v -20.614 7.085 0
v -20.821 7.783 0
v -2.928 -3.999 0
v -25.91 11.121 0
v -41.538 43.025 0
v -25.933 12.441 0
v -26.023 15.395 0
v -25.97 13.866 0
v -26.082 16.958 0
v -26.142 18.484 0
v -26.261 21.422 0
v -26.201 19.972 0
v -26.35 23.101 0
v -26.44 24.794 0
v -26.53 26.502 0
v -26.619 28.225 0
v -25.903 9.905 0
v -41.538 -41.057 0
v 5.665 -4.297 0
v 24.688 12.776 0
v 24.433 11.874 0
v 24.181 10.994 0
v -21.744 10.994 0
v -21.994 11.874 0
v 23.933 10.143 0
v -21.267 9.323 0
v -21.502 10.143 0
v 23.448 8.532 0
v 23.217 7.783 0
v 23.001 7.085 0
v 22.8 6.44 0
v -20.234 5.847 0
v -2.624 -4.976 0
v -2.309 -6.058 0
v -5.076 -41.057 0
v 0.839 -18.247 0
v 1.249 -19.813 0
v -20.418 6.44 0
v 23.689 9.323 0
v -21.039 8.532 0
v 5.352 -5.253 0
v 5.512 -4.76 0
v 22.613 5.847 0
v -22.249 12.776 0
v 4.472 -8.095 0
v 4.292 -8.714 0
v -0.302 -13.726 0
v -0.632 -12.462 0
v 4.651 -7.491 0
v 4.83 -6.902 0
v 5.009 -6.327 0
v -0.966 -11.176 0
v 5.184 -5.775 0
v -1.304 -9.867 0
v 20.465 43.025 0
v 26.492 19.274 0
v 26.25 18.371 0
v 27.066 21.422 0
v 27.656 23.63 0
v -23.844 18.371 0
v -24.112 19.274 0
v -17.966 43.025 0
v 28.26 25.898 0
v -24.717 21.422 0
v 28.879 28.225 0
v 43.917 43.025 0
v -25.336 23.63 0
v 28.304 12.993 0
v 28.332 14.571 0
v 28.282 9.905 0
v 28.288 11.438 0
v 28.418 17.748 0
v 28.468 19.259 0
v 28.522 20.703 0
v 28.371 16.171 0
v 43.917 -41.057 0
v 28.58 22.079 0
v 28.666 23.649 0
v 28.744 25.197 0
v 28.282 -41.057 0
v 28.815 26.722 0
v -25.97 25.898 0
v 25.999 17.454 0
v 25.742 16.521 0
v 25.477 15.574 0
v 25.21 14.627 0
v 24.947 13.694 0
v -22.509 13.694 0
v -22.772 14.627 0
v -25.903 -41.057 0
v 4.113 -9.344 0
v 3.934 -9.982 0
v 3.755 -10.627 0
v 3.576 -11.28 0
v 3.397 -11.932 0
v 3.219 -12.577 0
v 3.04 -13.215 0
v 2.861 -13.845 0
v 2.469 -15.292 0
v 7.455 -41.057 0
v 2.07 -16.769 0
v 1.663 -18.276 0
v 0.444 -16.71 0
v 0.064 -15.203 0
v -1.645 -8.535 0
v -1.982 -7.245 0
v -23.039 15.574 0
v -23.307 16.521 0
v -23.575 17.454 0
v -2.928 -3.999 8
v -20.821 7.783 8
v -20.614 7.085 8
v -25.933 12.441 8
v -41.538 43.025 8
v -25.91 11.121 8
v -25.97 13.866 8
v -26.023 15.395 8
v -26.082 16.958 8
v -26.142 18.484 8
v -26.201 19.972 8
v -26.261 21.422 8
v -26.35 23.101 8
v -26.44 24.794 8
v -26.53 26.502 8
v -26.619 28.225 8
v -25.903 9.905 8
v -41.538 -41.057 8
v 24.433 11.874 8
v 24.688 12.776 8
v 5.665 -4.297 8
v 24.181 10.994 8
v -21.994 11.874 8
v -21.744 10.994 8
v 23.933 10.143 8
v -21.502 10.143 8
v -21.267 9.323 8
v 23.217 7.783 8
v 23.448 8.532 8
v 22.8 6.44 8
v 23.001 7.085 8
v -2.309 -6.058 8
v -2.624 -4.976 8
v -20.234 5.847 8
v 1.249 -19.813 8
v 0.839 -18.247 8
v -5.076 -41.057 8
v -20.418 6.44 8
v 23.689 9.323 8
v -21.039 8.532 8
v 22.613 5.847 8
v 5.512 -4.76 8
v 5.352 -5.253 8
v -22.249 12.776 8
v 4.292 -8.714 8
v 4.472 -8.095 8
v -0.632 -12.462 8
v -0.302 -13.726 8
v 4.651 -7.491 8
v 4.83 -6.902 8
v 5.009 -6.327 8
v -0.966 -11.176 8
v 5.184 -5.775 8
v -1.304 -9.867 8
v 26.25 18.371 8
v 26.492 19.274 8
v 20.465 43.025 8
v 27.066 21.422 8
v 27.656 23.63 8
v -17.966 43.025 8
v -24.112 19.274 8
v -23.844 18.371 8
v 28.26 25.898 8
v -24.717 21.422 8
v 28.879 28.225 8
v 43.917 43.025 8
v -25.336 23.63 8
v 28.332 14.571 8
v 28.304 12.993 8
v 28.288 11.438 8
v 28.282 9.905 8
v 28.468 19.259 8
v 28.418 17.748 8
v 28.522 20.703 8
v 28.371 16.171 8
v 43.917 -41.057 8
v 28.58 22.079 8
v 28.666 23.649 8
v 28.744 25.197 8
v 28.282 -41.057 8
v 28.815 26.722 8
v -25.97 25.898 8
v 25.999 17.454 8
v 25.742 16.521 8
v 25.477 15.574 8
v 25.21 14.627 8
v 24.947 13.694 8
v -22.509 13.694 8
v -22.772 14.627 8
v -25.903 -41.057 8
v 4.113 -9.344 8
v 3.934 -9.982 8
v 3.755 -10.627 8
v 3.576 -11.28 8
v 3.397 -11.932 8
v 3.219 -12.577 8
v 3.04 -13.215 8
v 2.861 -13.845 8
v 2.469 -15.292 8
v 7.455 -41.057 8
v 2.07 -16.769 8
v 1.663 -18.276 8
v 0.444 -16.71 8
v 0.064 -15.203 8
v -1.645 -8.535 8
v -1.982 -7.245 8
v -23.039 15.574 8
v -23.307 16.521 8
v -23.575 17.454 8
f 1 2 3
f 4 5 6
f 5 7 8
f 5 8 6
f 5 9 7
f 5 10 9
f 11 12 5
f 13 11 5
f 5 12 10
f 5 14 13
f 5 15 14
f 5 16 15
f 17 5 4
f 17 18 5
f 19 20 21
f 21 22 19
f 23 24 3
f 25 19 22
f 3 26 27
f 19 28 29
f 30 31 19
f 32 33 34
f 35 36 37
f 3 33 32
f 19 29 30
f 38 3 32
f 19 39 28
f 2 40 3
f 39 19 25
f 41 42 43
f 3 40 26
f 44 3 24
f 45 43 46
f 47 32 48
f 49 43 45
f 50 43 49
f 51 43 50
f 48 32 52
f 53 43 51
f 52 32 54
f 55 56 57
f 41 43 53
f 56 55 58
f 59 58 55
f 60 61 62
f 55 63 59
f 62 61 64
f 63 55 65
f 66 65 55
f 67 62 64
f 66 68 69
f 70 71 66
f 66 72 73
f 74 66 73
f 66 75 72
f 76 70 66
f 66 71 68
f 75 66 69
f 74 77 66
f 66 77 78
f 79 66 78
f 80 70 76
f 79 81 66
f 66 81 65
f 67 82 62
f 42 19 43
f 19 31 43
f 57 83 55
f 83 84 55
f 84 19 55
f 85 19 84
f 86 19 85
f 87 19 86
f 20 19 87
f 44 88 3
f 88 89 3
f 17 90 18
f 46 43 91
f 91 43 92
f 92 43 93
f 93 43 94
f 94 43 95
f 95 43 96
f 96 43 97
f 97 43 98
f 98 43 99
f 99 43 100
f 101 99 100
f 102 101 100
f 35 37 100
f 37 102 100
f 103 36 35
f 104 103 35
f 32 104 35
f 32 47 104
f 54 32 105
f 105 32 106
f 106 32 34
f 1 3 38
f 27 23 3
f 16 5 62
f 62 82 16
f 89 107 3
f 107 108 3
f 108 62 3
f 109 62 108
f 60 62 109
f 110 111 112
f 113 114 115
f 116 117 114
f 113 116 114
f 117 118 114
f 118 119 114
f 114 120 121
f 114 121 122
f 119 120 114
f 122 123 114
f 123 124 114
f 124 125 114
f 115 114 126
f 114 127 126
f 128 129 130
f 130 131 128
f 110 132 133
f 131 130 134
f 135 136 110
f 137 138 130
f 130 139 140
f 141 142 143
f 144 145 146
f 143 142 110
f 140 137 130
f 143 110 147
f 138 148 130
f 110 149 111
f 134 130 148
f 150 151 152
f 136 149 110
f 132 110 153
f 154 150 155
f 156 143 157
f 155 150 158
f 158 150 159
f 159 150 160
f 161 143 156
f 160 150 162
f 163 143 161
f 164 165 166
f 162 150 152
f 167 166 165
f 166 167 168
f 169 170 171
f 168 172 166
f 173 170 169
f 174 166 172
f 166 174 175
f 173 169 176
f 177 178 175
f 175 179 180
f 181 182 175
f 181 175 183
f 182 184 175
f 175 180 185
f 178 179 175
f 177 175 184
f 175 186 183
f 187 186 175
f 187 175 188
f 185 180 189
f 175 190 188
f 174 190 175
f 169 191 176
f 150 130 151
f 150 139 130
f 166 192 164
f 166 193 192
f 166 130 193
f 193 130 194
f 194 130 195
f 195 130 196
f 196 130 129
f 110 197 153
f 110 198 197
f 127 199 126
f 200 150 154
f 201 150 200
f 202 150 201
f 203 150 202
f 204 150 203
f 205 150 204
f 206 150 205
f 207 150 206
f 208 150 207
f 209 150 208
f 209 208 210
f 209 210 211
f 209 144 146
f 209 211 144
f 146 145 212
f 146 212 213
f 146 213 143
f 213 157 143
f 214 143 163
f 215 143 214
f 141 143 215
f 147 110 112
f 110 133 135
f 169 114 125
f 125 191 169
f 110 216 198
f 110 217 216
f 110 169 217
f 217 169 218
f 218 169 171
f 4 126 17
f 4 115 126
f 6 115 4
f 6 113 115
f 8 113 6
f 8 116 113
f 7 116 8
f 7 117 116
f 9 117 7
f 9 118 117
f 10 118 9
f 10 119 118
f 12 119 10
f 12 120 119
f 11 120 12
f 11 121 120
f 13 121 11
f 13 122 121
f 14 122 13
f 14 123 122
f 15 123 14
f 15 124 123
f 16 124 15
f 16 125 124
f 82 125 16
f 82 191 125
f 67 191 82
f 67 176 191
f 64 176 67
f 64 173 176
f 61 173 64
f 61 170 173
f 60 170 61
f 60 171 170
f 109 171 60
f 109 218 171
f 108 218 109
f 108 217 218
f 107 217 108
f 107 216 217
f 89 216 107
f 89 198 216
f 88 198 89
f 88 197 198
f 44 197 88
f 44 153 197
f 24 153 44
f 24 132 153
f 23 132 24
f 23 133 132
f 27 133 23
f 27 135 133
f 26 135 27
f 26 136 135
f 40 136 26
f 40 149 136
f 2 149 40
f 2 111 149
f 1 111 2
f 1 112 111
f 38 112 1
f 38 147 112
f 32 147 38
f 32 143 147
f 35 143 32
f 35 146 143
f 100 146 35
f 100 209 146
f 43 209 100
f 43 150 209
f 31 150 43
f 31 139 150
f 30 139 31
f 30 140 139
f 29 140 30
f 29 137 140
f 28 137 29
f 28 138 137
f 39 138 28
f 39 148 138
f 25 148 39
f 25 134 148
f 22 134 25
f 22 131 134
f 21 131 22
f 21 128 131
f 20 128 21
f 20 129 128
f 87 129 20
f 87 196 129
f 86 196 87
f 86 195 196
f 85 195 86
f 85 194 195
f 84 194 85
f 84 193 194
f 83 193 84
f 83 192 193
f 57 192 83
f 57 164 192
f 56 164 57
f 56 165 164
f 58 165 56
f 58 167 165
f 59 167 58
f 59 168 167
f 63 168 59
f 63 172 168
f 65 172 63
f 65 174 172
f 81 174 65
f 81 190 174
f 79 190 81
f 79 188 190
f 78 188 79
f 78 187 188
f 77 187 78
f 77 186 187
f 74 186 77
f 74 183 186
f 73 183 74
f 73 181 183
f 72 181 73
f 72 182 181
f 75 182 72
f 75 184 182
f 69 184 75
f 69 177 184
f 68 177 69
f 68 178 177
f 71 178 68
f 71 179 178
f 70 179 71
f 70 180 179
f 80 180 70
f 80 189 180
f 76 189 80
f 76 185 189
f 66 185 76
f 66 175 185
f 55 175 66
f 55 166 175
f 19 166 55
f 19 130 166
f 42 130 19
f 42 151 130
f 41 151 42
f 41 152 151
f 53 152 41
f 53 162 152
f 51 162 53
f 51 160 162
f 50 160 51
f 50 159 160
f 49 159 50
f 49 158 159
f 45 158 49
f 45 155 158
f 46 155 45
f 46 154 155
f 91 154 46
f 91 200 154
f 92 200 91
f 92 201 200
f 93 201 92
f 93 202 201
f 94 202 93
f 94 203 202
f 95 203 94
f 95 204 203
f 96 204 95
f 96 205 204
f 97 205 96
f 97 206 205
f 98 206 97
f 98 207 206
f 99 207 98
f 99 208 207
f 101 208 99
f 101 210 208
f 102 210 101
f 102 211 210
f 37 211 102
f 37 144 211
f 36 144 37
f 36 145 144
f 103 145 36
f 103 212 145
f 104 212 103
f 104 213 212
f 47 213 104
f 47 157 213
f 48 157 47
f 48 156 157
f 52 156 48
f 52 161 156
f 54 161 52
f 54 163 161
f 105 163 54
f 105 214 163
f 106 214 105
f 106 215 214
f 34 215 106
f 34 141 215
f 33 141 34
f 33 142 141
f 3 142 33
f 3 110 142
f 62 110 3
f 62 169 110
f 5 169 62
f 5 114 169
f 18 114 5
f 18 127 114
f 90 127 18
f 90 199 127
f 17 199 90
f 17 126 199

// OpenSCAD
module glyph_2d() {
  text("M", size = 88, font = "Liberation Sans:style=Bold", halign = "center", valign = "center");
}
linear_extrude(height = 8) glyph_2d();
